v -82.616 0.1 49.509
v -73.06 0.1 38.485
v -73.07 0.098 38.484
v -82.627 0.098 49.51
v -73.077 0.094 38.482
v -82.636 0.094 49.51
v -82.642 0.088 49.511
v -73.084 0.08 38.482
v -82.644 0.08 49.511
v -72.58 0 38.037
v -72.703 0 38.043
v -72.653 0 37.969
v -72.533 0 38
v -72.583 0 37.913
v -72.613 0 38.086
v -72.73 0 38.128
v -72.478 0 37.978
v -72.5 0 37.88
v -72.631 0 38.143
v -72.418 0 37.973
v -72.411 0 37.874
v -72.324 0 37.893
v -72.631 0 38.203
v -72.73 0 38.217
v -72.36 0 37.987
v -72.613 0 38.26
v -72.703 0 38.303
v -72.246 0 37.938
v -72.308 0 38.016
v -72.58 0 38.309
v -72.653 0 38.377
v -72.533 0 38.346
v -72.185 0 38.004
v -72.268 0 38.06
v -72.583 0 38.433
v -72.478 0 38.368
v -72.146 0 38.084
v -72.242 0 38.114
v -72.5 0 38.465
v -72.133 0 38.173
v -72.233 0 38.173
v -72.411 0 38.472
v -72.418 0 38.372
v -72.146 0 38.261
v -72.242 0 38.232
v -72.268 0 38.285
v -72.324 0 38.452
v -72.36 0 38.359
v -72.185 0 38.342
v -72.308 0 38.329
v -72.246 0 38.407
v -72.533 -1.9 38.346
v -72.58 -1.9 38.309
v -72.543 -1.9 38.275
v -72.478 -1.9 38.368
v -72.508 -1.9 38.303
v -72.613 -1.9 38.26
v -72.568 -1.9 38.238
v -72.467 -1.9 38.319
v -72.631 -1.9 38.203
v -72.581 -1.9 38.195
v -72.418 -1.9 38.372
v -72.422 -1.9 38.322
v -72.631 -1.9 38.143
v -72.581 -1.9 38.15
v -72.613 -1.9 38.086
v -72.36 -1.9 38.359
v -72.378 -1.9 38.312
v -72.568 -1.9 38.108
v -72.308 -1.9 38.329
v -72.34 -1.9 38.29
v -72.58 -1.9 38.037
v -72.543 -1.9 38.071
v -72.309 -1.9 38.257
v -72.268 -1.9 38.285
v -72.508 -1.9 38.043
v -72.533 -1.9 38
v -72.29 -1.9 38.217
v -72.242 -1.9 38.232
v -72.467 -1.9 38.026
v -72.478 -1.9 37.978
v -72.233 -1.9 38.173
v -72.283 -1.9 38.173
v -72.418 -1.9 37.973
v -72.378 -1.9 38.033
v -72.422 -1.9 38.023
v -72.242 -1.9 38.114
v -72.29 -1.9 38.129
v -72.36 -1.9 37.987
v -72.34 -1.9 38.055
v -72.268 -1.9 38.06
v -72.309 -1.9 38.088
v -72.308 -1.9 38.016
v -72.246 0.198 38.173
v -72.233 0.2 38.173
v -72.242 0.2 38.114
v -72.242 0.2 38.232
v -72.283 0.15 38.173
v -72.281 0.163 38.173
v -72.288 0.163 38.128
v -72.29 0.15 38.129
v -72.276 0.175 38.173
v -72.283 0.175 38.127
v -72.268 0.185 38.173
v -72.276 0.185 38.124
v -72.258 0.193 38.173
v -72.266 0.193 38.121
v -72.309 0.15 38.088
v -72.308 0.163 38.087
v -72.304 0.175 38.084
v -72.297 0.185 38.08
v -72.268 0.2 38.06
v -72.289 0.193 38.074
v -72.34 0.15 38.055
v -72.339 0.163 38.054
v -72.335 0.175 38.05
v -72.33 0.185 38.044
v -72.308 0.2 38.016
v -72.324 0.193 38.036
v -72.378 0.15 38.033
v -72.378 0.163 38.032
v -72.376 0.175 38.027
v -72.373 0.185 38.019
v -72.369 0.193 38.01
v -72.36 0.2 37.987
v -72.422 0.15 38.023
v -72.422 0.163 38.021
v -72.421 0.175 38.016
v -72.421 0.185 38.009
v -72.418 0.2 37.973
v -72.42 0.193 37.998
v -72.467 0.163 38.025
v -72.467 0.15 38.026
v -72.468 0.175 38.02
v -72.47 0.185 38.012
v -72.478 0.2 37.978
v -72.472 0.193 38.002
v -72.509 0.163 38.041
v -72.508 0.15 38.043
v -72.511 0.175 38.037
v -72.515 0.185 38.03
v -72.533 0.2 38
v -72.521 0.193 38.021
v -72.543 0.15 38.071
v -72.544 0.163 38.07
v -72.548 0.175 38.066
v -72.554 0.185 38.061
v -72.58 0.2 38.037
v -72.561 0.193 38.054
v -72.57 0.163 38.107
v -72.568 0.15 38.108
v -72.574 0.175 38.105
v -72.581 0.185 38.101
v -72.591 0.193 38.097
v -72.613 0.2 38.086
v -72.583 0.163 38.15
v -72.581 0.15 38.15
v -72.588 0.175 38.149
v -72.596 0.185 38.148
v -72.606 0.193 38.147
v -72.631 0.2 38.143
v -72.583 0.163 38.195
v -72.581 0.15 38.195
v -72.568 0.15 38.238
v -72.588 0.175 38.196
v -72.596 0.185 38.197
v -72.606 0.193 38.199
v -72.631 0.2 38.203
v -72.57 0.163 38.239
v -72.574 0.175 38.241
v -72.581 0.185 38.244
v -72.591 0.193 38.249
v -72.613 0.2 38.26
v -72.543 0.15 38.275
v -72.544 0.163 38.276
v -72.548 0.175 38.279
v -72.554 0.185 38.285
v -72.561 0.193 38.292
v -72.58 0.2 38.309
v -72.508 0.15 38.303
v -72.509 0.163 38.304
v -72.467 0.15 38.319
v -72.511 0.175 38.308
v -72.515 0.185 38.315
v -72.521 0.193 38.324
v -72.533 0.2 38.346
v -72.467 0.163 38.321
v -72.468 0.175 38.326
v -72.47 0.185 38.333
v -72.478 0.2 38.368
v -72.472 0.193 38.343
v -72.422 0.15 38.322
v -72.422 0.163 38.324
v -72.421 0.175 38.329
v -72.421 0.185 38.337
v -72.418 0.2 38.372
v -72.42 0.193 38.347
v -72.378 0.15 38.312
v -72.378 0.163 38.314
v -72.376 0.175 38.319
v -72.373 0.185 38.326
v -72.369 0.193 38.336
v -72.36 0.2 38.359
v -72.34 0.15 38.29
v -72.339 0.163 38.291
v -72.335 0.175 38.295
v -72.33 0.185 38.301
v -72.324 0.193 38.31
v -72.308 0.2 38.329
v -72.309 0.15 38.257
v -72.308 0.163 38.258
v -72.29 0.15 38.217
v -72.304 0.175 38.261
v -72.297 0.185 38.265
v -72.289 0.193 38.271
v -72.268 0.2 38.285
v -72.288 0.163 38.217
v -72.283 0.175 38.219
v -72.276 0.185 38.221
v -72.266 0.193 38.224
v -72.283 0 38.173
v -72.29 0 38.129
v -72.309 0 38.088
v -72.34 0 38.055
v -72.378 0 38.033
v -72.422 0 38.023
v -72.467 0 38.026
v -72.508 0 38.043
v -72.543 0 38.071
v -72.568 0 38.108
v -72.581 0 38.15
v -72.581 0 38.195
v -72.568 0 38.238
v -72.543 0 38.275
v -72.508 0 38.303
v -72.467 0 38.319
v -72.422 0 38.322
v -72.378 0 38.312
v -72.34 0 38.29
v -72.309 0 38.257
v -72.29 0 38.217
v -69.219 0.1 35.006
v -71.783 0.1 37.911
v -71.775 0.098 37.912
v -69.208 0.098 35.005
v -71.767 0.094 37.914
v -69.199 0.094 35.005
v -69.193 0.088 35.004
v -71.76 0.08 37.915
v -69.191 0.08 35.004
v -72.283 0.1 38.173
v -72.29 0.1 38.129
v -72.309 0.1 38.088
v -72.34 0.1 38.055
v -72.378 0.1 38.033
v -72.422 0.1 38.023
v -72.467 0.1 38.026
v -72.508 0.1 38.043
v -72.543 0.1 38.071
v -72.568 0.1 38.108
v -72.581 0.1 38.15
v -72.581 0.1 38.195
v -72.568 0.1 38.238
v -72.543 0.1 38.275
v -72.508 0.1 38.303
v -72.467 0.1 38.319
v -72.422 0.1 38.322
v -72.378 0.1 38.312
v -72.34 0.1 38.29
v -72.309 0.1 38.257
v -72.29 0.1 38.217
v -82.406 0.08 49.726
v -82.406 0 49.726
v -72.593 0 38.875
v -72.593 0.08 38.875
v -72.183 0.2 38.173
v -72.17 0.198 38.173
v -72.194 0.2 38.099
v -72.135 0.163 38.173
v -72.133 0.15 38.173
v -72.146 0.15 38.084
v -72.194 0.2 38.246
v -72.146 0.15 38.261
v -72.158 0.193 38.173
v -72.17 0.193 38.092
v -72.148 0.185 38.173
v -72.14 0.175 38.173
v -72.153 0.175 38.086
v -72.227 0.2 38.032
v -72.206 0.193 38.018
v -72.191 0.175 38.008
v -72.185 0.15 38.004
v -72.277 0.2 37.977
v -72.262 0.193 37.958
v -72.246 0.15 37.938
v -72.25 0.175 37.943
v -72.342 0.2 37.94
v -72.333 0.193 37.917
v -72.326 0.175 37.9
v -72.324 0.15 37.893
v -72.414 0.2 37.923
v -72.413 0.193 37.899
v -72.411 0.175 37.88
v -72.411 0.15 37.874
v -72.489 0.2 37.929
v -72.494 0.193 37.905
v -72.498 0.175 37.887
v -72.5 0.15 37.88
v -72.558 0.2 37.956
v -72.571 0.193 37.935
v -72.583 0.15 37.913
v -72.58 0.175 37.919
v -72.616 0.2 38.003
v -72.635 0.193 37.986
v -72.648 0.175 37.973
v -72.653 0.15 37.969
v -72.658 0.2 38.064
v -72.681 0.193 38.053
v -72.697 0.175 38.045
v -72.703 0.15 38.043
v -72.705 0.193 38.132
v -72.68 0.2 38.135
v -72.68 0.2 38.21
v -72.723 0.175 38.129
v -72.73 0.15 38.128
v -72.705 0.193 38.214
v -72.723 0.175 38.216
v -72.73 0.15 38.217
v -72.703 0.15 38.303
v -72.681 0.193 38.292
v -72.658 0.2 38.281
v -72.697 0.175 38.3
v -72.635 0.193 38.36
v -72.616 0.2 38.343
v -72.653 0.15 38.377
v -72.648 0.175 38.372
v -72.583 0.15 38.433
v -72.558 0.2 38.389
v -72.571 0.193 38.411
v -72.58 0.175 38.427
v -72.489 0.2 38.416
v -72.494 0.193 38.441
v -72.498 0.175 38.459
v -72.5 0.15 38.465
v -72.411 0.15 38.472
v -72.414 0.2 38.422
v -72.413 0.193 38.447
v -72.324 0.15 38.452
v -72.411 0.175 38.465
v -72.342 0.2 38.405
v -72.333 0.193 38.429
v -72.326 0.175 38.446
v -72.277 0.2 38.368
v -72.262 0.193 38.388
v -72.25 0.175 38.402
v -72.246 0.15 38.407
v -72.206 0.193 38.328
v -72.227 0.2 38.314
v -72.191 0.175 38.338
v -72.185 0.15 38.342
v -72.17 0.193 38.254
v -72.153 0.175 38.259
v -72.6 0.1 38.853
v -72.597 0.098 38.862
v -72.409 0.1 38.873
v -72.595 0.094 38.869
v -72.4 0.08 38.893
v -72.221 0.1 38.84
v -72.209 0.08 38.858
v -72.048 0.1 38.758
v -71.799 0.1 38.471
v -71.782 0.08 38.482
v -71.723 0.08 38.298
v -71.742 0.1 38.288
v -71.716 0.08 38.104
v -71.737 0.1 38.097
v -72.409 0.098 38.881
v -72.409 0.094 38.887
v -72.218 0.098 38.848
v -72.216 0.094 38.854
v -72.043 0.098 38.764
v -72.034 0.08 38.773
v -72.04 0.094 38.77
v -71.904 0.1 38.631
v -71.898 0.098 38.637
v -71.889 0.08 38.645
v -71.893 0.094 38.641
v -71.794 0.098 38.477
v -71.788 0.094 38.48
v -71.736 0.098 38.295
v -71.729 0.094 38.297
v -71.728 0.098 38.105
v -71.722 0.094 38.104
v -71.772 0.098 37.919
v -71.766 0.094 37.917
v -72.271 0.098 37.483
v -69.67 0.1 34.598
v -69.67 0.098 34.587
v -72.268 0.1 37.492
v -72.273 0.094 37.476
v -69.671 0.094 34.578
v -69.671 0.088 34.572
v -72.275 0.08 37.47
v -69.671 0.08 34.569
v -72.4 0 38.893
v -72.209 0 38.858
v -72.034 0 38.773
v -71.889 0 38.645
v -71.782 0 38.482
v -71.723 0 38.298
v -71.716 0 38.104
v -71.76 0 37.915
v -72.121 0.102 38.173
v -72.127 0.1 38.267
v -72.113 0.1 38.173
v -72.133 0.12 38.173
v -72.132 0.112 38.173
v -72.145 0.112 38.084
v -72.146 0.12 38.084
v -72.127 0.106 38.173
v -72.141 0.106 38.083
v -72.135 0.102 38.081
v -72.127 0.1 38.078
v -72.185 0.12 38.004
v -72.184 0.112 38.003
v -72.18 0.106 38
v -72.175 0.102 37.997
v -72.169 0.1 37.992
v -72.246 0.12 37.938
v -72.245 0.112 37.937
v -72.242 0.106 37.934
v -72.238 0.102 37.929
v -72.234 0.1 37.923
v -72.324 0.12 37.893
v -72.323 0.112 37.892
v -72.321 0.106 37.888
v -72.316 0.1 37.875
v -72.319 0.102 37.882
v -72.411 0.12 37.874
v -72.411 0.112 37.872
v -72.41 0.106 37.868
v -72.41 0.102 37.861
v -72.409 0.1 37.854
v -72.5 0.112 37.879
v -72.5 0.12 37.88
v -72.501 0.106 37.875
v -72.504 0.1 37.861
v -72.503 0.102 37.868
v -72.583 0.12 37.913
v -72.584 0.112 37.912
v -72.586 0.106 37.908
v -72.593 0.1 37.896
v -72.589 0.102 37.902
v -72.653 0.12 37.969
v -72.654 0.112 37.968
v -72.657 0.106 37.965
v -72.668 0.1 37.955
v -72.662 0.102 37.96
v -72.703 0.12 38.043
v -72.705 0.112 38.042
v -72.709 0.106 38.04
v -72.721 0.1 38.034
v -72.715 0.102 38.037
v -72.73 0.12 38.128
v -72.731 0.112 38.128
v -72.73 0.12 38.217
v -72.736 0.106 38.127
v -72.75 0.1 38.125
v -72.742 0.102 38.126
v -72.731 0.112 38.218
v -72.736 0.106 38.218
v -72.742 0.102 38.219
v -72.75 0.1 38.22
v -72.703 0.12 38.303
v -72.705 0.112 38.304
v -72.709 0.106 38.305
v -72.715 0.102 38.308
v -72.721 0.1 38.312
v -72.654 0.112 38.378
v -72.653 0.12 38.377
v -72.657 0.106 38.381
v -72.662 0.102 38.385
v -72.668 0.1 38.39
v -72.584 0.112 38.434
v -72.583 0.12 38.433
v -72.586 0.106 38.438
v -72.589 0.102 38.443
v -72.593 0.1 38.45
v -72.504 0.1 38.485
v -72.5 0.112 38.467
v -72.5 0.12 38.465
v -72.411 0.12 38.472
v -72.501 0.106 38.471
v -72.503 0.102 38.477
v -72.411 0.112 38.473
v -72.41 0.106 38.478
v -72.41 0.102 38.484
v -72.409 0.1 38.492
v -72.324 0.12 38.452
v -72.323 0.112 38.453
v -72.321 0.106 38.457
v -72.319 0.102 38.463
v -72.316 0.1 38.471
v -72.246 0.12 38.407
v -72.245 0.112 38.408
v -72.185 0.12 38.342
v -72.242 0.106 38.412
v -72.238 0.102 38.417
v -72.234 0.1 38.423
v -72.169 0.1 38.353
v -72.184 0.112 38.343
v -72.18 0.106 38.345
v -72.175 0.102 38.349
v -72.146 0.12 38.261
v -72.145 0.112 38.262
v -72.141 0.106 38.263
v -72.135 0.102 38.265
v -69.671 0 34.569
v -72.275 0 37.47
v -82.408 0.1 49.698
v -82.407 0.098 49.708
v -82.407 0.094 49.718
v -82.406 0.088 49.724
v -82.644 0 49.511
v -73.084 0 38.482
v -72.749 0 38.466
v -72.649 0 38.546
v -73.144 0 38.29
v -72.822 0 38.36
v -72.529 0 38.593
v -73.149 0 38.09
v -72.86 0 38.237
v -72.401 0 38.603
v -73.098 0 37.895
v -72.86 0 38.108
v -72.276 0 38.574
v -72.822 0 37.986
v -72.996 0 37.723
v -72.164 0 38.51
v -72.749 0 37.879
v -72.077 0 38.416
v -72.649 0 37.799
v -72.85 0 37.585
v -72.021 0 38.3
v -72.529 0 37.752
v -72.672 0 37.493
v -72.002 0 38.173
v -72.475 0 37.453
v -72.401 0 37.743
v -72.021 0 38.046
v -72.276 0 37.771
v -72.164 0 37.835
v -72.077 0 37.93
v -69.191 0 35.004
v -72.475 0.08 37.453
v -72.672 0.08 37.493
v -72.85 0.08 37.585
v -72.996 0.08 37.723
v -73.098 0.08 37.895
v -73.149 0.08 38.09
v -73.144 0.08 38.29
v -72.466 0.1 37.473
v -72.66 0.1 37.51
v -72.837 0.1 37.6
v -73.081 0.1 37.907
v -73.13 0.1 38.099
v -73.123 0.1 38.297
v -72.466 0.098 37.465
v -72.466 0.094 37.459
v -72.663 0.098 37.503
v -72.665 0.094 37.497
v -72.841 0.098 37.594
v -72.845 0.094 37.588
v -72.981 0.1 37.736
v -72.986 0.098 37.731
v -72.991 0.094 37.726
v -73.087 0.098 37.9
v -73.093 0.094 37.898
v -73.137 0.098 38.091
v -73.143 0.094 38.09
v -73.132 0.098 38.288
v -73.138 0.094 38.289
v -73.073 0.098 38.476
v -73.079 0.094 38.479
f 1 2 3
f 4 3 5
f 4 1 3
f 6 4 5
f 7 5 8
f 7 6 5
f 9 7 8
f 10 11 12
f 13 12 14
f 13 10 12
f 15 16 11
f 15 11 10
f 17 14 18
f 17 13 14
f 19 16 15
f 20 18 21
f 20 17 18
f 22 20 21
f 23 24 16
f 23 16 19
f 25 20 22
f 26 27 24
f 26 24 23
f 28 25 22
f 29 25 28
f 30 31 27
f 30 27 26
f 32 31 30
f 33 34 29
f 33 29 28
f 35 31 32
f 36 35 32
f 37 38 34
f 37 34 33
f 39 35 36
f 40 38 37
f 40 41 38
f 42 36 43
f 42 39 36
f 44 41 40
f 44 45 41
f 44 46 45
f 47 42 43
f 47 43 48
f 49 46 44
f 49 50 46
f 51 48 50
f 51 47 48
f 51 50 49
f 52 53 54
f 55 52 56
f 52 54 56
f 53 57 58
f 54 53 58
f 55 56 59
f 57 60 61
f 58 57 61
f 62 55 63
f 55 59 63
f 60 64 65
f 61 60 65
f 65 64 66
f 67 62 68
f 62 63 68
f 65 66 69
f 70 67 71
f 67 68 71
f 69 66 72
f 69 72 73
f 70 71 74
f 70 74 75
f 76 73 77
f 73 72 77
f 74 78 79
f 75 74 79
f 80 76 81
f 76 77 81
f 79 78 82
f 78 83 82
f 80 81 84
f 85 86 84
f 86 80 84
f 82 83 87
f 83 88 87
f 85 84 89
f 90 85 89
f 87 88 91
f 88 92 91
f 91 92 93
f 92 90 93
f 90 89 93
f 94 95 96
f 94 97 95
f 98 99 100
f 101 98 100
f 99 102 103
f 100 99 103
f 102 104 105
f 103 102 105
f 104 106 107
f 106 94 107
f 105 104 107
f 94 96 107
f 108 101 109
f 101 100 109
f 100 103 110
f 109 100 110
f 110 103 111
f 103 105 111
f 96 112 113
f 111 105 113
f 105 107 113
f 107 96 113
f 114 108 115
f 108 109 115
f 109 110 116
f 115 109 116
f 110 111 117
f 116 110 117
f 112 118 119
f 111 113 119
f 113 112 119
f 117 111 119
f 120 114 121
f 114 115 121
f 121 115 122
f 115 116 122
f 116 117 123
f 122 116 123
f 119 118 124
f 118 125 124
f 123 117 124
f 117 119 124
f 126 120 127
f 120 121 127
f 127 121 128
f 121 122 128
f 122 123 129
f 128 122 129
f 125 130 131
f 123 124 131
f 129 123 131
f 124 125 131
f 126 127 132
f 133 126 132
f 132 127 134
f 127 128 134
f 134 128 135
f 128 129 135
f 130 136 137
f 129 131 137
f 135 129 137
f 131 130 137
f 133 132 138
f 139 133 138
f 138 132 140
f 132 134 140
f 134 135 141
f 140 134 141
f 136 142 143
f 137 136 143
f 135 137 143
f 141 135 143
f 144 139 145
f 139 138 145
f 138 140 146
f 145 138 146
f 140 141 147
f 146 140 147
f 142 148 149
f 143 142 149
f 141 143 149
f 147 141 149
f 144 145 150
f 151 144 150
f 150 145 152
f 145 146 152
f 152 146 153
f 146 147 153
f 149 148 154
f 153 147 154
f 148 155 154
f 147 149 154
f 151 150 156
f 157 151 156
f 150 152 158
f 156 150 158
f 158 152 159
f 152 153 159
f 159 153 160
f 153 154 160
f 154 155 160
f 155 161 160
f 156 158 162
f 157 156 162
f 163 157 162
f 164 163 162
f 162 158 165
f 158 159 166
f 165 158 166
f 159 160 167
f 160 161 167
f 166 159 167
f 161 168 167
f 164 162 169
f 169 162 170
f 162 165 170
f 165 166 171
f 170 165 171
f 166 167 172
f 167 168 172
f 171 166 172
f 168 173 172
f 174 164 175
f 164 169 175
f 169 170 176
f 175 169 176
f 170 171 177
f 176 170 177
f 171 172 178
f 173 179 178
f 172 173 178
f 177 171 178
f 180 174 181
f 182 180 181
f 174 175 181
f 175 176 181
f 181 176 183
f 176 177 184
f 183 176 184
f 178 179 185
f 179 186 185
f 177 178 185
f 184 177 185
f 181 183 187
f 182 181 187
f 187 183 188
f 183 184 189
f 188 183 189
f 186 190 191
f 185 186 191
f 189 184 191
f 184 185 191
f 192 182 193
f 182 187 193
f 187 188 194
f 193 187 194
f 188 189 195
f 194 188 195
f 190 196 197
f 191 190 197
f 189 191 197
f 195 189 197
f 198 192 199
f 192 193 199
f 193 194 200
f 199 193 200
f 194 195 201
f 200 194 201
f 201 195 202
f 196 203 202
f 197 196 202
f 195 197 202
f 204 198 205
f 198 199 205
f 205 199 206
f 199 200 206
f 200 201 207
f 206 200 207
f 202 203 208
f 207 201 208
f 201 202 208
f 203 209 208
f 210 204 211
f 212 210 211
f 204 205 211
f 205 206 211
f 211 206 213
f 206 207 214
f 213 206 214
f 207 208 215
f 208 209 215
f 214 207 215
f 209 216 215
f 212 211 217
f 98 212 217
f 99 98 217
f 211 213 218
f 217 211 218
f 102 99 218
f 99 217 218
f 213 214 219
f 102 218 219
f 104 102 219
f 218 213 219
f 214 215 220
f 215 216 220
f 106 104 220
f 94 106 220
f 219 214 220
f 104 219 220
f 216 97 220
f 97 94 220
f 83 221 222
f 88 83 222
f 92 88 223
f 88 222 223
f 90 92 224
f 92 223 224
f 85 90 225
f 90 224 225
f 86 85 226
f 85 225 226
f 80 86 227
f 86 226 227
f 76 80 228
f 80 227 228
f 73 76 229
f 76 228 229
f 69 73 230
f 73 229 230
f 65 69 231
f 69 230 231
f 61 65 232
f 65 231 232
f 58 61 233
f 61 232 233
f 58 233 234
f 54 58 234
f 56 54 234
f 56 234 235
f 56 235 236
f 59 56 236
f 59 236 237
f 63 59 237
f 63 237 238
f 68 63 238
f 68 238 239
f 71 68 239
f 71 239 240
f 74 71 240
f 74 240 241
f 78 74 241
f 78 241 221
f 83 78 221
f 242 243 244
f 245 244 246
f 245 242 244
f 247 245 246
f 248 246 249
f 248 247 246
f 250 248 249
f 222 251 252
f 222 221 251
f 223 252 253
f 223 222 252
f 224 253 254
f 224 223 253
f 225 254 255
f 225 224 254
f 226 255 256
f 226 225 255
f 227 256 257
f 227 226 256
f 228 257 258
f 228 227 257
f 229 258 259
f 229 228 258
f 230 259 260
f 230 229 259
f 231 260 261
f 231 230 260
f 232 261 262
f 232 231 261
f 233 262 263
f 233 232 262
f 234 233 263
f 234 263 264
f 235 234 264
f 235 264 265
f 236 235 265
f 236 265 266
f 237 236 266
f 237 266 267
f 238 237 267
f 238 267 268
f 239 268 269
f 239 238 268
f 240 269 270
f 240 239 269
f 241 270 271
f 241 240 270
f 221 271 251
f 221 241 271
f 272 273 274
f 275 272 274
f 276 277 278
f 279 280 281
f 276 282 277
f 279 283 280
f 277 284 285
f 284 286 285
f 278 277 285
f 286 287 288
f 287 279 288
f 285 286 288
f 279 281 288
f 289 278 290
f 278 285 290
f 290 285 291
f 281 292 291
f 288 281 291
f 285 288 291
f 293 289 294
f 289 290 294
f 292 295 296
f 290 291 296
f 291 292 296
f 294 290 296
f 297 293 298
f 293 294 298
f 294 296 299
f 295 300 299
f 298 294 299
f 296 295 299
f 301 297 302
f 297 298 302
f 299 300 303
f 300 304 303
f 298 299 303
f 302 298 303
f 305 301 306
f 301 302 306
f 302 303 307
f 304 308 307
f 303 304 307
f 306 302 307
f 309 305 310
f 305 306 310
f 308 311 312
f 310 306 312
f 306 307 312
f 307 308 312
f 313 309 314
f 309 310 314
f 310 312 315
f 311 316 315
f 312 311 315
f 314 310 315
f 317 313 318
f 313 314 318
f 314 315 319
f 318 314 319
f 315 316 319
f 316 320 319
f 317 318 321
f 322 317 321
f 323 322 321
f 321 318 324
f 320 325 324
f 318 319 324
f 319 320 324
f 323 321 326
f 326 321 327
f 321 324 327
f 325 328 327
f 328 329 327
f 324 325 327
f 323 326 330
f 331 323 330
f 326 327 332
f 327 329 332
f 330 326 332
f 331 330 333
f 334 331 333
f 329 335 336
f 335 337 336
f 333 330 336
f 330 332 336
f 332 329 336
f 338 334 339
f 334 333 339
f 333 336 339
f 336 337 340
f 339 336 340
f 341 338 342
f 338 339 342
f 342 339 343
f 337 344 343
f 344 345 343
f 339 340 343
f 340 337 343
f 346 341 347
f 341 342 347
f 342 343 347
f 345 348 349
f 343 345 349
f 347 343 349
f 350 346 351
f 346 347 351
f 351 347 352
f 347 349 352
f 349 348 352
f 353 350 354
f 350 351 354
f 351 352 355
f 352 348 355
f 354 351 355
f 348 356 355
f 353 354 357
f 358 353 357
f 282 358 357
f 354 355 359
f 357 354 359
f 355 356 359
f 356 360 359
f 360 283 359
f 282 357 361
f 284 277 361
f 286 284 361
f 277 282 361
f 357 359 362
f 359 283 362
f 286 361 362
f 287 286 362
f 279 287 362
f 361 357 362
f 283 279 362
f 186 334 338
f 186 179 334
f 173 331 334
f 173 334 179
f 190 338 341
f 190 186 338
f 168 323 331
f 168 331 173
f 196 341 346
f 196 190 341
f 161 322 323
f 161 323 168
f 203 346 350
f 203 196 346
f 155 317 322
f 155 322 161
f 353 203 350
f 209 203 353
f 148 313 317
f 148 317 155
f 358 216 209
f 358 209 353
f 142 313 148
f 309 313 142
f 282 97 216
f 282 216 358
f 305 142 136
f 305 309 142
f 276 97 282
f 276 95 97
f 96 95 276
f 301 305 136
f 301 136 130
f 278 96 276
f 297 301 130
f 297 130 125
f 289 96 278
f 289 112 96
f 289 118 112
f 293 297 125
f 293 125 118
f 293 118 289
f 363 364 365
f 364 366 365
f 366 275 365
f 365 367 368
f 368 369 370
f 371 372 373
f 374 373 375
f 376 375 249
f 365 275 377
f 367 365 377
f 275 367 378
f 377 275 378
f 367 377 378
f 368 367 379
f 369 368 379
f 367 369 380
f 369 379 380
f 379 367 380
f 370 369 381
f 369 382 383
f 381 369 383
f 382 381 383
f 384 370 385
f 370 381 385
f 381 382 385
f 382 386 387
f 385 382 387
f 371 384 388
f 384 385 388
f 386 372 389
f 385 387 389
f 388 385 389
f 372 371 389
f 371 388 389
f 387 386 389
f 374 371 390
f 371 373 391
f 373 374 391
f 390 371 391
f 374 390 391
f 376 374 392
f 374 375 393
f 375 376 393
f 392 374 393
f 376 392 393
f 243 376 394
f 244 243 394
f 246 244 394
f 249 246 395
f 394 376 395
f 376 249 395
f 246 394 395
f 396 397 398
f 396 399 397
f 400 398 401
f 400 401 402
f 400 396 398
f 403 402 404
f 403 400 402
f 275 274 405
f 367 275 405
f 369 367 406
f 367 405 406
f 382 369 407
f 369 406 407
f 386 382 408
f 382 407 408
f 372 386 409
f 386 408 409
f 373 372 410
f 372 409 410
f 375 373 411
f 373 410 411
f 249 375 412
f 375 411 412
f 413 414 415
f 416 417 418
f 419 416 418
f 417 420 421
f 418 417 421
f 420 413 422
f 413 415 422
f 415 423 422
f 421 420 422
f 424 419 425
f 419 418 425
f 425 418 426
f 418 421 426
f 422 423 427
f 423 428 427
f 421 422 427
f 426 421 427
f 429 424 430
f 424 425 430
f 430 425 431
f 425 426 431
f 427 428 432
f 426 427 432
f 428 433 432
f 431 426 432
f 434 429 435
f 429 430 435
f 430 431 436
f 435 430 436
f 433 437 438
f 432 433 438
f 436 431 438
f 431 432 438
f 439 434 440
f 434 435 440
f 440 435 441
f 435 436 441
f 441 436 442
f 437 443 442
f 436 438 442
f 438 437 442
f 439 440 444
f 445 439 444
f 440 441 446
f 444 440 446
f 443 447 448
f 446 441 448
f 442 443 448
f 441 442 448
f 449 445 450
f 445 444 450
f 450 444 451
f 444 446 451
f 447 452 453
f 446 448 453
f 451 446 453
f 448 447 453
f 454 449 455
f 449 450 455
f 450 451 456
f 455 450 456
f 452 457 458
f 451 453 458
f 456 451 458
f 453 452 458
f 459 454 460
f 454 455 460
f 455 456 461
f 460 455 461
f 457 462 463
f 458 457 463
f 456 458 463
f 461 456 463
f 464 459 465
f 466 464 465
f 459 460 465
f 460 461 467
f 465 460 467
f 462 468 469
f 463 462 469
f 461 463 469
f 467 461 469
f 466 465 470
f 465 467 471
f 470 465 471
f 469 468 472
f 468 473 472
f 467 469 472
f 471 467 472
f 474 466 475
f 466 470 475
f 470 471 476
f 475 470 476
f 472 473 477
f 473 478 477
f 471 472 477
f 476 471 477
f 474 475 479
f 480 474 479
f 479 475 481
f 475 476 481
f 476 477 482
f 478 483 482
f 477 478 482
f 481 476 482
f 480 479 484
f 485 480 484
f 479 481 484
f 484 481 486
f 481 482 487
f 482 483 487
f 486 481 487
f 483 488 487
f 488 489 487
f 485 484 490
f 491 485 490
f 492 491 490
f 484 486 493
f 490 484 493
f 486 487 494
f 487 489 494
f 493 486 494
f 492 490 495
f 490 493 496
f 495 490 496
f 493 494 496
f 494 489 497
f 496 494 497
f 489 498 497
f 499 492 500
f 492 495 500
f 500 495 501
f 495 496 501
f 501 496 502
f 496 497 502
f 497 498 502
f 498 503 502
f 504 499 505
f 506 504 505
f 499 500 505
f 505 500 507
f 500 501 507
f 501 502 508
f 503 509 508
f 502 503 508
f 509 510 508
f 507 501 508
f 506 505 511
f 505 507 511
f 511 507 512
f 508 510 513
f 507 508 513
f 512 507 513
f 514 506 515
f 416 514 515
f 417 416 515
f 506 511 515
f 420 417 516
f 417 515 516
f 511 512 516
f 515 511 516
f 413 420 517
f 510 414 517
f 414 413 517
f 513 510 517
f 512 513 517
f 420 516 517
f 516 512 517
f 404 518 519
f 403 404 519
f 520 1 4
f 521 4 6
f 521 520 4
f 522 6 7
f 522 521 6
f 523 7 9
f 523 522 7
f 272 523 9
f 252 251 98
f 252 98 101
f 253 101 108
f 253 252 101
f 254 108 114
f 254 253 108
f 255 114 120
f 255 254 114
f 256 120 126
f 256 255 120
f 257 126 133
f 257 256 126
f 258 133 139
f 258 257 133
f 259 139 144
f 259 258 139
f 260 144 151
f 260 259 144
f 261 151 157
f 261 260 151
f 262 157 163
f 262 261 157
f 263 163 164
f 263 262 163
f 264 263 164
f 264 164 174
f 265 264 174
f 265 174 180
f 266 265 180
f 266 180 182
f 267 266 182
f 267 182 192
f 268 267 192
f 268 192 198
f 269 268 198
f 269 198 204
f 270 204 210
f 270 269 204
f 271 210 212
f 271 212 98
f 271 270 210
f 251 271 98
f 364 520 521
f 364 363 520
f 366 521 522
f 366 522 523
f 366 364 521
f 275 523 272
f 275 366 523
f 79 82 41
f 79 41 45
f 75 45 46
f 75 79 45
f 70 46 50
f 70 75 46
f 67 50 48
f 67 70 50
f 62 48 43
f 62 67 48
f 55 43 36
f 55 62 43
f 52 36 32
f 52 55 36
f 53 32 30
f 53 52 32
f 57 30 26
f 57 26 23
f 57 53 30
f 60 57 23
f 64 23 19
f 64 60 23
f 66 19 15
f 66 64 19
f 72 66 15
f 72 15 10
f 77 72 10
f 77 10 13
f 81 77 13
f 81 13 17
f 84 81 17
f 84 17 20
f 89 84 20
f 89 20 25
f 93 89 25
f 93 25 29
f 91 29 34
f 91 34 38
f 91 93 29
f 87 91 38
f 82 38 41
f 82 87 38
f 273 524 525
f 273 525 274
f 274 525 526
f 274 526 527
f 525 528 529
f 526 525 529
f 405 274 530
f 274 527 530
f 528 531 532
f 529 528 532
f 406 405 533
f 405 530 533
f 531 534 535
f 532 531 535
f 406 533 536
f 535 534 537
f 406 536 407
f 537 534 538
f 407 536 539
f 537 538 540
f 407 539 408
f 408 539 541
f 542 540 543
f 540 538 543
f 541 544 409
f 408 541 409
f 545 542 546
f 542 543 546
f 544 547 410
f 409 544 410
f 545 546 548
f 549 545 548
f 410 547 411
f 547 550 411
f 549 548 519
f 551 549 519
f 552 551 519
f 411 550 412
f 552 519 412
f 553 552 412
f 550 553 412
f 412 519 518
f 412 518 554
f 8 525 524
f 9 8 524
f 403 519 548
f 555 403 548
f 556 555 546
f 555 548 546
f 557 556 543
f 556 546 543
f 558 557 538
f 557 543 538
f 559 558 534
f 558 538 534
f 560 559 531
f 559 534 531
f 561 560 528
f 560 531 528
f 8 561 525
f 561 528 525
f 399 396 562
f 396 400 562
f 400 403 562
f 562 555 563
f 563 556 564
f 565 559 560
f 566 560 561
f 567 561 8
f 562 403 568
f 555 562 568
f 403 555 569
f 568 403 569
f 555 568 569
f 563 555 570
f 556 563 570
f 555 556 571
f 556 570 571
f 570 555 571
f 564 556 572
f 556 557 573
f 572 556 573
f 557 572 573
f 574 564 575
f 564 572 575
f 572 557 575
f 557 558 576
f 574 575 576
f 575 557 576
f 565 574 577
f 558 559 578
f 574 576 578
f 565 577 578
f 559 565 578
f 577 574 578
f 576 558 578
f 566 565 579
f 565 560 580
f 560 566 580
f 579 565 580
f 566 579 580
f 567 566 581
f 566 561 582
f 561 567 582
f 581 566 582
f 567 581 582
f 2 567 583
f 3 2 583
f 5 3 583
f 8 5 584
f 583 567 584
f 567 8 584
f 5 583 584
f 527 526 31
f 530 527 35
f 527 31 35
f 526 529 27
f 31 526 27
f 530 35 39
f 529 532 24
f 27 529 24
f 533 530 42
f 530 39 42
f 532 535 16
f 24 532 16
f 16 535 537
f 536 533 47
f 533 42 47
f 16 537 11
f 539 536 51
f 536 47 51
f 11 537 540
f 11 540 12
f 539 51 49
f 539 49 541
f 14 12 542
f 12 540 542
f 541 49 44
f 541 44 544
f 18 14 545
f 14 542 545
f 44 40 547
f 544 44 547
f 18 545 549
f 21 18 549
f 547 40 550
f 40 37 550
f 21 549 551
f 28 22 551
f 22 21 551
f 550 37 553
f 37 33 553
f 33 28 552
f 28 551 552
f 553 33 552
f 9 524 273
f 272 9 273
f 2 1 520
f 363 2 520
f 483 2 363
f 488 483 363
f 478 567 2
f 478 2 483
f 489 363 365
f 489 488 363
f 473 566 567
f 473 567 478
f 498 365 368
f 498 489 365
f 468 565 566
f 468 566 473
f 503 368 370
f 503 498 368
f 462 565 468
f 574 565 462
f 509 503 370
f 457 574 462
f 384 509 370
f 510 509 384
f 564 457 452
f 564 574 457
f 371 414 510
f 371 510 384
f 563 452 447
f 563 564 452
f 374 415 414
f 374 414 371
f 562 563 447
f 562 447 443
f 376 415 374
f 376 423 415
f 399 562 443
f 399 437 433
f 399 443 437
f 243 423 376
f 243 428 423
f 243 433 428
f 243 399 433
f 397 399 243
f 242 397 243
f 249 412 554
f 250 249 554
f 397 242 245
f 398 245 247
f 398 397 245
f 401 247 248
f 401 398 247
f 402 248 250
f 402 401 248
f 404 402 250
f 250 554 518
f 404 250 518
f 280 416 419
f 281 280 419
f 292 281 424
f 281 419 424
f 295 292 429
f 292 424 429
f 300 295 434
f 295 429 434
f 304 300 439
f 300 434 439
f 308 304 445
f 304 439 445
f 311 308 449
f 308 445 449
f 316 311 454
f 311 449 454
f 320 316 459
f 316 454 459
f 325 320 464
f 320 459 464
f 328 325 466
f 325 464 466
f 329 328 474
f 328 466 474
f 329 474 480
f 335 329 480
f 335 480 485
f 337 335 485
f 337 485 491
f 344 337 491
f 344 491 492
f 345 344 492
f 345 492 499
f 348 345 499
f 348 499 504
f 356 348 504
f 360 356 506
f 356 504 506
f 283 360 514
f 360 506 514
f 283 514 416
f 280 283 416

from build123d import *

# Parameters (mm, degrees)
SKETCH1_R                = 0.15
BOSS_EXTRUDE1_DEPTH      = 0.1
SKETCH2_R                = 0.3
SKETCH2_R_2              = 0.15
BOSS_EXTRUDE2_DEPTH      = 0.1
BOSS_EXTRUDE2_DEPTH_BACK = 2
FILLET1_R                = 0.05
FILLET2_R                = 0.02
SKETCH3_R                = 0.431407551
SKETCH3_R_2              = 0.2
CUT_EXTRUDE1_DEPTH       = 1.9


with BuildPart() as part:
    # Sketch1 → Boss-Extrude1 (new body)
    with BuildSketch(Plane(origin=(0, 0, 0), x_dir=(1, 0, 0), z_dir=(0, 1, 0))):
        with BuildLine():
            Line((-82.406253285, -49.725868429), (-72.592962822, -38.875374501))
            ThreePointArc((-72.592962822, -38.875374501), (-71.888648973, -38.644732606), (-71.760288486, -37.914816674))
            Line((-71.760288486, -37.914816674), (-69.191054527, -35.004040233))
            Line((-69.191054527, -35.004040233), (-69.671325788, -34.569459042))
            Line((-69.671325788, -34.569459042), (-72.275341711, -37.469639173))
            ThreePointArc((-72.275341711, -37.469639173), (-72.996004438, -37.722822834), (-73.084190733, -38.481558565))
            Line((-73.084190733, -38.481558565), (-82.643859616, -49.510974991))
            Line((-82.643859616, -49.510974991), (-82.406253285, -49.725868429))
        make_face()
        with Locations((-72.433134731, -38.172736745)):
            Circle(SKETCH1_R, mode=Mode.SUBTRACT)
    extrude(amount=BOSS_EXTRUDE1_DEPTH)

    # Sketch2 → Boss-Extrude2 (add, two sides)
    with BuildSketch(Plane(origin=(0, 0.1, 0), x_dir=(1, 0, 0), z_dir=(0, 1, 0))) as boss_extrude2_sk:
        with Locations((-72.433134731, -38.172736745)):
            Circle(SKETCH2_R)
        with Locations((-72.433134731, -38.172736745)):
            Circle(SKETCH2_R_2, mode=Mode.SUBTRACT)
    extrude(amount=BOSS_EXTRUDE2_DEPTH)
    extrude(boss_extrude2_sk.sketch, amount=-BOSS_EXTRUDE2_DEPTH_BACK)

    # Fillet1
    fillet1_edges = [part.edges().sort_by_distance(p)[0] for p in [
        (-72.583134731, 0.2, 38.172736745),
        (-72.733134731, 0.2, 38.172736745),
    ]]
    fillet(fillet1_edges, radius=FILLET1_R)

    # Fillet2
    fillet2_edges = [part.edges().sort_by_distance(p)[0] for p in [
        (-77.499608053, 0.1, 44.300621465),
        (-71.888648973, 0.1, 38.644732606),
        (-70.475671506, 0.1, 36.459428453),
        (-69.431190157, 0.1, 34.786749638),
        (-70.973333749, 0.1, 36.019549108),
        (-72.733134731, 0.1, 38.172736745),
        (-72.996004438, 0.1, 37.722822834),
        (-77.864025175, 0.1, 43.996266778),
        (-82.52505645, 0.1, 49.61842171),
    ]]
    fillet(fillet2_edges, radius=FILLET2_R)

    # Sketch3 → Cut-Extrude1 (cut)
    with BuildSketch(Plane.XZ.offset(1.9)):
        with Locations((-72.433134731, 38.172736745)):
            Circle(SKETCH3_R)
        with Locations((-72.433134731, 38.172736745)):
            Circle(SKETCH3_R_2, mode=Mode.SUBTRACT)
    extrude(amount=-CUT_EXTRUDE1_DEPTH, mode=Mode.SUBTRACT)


solid = part.part
